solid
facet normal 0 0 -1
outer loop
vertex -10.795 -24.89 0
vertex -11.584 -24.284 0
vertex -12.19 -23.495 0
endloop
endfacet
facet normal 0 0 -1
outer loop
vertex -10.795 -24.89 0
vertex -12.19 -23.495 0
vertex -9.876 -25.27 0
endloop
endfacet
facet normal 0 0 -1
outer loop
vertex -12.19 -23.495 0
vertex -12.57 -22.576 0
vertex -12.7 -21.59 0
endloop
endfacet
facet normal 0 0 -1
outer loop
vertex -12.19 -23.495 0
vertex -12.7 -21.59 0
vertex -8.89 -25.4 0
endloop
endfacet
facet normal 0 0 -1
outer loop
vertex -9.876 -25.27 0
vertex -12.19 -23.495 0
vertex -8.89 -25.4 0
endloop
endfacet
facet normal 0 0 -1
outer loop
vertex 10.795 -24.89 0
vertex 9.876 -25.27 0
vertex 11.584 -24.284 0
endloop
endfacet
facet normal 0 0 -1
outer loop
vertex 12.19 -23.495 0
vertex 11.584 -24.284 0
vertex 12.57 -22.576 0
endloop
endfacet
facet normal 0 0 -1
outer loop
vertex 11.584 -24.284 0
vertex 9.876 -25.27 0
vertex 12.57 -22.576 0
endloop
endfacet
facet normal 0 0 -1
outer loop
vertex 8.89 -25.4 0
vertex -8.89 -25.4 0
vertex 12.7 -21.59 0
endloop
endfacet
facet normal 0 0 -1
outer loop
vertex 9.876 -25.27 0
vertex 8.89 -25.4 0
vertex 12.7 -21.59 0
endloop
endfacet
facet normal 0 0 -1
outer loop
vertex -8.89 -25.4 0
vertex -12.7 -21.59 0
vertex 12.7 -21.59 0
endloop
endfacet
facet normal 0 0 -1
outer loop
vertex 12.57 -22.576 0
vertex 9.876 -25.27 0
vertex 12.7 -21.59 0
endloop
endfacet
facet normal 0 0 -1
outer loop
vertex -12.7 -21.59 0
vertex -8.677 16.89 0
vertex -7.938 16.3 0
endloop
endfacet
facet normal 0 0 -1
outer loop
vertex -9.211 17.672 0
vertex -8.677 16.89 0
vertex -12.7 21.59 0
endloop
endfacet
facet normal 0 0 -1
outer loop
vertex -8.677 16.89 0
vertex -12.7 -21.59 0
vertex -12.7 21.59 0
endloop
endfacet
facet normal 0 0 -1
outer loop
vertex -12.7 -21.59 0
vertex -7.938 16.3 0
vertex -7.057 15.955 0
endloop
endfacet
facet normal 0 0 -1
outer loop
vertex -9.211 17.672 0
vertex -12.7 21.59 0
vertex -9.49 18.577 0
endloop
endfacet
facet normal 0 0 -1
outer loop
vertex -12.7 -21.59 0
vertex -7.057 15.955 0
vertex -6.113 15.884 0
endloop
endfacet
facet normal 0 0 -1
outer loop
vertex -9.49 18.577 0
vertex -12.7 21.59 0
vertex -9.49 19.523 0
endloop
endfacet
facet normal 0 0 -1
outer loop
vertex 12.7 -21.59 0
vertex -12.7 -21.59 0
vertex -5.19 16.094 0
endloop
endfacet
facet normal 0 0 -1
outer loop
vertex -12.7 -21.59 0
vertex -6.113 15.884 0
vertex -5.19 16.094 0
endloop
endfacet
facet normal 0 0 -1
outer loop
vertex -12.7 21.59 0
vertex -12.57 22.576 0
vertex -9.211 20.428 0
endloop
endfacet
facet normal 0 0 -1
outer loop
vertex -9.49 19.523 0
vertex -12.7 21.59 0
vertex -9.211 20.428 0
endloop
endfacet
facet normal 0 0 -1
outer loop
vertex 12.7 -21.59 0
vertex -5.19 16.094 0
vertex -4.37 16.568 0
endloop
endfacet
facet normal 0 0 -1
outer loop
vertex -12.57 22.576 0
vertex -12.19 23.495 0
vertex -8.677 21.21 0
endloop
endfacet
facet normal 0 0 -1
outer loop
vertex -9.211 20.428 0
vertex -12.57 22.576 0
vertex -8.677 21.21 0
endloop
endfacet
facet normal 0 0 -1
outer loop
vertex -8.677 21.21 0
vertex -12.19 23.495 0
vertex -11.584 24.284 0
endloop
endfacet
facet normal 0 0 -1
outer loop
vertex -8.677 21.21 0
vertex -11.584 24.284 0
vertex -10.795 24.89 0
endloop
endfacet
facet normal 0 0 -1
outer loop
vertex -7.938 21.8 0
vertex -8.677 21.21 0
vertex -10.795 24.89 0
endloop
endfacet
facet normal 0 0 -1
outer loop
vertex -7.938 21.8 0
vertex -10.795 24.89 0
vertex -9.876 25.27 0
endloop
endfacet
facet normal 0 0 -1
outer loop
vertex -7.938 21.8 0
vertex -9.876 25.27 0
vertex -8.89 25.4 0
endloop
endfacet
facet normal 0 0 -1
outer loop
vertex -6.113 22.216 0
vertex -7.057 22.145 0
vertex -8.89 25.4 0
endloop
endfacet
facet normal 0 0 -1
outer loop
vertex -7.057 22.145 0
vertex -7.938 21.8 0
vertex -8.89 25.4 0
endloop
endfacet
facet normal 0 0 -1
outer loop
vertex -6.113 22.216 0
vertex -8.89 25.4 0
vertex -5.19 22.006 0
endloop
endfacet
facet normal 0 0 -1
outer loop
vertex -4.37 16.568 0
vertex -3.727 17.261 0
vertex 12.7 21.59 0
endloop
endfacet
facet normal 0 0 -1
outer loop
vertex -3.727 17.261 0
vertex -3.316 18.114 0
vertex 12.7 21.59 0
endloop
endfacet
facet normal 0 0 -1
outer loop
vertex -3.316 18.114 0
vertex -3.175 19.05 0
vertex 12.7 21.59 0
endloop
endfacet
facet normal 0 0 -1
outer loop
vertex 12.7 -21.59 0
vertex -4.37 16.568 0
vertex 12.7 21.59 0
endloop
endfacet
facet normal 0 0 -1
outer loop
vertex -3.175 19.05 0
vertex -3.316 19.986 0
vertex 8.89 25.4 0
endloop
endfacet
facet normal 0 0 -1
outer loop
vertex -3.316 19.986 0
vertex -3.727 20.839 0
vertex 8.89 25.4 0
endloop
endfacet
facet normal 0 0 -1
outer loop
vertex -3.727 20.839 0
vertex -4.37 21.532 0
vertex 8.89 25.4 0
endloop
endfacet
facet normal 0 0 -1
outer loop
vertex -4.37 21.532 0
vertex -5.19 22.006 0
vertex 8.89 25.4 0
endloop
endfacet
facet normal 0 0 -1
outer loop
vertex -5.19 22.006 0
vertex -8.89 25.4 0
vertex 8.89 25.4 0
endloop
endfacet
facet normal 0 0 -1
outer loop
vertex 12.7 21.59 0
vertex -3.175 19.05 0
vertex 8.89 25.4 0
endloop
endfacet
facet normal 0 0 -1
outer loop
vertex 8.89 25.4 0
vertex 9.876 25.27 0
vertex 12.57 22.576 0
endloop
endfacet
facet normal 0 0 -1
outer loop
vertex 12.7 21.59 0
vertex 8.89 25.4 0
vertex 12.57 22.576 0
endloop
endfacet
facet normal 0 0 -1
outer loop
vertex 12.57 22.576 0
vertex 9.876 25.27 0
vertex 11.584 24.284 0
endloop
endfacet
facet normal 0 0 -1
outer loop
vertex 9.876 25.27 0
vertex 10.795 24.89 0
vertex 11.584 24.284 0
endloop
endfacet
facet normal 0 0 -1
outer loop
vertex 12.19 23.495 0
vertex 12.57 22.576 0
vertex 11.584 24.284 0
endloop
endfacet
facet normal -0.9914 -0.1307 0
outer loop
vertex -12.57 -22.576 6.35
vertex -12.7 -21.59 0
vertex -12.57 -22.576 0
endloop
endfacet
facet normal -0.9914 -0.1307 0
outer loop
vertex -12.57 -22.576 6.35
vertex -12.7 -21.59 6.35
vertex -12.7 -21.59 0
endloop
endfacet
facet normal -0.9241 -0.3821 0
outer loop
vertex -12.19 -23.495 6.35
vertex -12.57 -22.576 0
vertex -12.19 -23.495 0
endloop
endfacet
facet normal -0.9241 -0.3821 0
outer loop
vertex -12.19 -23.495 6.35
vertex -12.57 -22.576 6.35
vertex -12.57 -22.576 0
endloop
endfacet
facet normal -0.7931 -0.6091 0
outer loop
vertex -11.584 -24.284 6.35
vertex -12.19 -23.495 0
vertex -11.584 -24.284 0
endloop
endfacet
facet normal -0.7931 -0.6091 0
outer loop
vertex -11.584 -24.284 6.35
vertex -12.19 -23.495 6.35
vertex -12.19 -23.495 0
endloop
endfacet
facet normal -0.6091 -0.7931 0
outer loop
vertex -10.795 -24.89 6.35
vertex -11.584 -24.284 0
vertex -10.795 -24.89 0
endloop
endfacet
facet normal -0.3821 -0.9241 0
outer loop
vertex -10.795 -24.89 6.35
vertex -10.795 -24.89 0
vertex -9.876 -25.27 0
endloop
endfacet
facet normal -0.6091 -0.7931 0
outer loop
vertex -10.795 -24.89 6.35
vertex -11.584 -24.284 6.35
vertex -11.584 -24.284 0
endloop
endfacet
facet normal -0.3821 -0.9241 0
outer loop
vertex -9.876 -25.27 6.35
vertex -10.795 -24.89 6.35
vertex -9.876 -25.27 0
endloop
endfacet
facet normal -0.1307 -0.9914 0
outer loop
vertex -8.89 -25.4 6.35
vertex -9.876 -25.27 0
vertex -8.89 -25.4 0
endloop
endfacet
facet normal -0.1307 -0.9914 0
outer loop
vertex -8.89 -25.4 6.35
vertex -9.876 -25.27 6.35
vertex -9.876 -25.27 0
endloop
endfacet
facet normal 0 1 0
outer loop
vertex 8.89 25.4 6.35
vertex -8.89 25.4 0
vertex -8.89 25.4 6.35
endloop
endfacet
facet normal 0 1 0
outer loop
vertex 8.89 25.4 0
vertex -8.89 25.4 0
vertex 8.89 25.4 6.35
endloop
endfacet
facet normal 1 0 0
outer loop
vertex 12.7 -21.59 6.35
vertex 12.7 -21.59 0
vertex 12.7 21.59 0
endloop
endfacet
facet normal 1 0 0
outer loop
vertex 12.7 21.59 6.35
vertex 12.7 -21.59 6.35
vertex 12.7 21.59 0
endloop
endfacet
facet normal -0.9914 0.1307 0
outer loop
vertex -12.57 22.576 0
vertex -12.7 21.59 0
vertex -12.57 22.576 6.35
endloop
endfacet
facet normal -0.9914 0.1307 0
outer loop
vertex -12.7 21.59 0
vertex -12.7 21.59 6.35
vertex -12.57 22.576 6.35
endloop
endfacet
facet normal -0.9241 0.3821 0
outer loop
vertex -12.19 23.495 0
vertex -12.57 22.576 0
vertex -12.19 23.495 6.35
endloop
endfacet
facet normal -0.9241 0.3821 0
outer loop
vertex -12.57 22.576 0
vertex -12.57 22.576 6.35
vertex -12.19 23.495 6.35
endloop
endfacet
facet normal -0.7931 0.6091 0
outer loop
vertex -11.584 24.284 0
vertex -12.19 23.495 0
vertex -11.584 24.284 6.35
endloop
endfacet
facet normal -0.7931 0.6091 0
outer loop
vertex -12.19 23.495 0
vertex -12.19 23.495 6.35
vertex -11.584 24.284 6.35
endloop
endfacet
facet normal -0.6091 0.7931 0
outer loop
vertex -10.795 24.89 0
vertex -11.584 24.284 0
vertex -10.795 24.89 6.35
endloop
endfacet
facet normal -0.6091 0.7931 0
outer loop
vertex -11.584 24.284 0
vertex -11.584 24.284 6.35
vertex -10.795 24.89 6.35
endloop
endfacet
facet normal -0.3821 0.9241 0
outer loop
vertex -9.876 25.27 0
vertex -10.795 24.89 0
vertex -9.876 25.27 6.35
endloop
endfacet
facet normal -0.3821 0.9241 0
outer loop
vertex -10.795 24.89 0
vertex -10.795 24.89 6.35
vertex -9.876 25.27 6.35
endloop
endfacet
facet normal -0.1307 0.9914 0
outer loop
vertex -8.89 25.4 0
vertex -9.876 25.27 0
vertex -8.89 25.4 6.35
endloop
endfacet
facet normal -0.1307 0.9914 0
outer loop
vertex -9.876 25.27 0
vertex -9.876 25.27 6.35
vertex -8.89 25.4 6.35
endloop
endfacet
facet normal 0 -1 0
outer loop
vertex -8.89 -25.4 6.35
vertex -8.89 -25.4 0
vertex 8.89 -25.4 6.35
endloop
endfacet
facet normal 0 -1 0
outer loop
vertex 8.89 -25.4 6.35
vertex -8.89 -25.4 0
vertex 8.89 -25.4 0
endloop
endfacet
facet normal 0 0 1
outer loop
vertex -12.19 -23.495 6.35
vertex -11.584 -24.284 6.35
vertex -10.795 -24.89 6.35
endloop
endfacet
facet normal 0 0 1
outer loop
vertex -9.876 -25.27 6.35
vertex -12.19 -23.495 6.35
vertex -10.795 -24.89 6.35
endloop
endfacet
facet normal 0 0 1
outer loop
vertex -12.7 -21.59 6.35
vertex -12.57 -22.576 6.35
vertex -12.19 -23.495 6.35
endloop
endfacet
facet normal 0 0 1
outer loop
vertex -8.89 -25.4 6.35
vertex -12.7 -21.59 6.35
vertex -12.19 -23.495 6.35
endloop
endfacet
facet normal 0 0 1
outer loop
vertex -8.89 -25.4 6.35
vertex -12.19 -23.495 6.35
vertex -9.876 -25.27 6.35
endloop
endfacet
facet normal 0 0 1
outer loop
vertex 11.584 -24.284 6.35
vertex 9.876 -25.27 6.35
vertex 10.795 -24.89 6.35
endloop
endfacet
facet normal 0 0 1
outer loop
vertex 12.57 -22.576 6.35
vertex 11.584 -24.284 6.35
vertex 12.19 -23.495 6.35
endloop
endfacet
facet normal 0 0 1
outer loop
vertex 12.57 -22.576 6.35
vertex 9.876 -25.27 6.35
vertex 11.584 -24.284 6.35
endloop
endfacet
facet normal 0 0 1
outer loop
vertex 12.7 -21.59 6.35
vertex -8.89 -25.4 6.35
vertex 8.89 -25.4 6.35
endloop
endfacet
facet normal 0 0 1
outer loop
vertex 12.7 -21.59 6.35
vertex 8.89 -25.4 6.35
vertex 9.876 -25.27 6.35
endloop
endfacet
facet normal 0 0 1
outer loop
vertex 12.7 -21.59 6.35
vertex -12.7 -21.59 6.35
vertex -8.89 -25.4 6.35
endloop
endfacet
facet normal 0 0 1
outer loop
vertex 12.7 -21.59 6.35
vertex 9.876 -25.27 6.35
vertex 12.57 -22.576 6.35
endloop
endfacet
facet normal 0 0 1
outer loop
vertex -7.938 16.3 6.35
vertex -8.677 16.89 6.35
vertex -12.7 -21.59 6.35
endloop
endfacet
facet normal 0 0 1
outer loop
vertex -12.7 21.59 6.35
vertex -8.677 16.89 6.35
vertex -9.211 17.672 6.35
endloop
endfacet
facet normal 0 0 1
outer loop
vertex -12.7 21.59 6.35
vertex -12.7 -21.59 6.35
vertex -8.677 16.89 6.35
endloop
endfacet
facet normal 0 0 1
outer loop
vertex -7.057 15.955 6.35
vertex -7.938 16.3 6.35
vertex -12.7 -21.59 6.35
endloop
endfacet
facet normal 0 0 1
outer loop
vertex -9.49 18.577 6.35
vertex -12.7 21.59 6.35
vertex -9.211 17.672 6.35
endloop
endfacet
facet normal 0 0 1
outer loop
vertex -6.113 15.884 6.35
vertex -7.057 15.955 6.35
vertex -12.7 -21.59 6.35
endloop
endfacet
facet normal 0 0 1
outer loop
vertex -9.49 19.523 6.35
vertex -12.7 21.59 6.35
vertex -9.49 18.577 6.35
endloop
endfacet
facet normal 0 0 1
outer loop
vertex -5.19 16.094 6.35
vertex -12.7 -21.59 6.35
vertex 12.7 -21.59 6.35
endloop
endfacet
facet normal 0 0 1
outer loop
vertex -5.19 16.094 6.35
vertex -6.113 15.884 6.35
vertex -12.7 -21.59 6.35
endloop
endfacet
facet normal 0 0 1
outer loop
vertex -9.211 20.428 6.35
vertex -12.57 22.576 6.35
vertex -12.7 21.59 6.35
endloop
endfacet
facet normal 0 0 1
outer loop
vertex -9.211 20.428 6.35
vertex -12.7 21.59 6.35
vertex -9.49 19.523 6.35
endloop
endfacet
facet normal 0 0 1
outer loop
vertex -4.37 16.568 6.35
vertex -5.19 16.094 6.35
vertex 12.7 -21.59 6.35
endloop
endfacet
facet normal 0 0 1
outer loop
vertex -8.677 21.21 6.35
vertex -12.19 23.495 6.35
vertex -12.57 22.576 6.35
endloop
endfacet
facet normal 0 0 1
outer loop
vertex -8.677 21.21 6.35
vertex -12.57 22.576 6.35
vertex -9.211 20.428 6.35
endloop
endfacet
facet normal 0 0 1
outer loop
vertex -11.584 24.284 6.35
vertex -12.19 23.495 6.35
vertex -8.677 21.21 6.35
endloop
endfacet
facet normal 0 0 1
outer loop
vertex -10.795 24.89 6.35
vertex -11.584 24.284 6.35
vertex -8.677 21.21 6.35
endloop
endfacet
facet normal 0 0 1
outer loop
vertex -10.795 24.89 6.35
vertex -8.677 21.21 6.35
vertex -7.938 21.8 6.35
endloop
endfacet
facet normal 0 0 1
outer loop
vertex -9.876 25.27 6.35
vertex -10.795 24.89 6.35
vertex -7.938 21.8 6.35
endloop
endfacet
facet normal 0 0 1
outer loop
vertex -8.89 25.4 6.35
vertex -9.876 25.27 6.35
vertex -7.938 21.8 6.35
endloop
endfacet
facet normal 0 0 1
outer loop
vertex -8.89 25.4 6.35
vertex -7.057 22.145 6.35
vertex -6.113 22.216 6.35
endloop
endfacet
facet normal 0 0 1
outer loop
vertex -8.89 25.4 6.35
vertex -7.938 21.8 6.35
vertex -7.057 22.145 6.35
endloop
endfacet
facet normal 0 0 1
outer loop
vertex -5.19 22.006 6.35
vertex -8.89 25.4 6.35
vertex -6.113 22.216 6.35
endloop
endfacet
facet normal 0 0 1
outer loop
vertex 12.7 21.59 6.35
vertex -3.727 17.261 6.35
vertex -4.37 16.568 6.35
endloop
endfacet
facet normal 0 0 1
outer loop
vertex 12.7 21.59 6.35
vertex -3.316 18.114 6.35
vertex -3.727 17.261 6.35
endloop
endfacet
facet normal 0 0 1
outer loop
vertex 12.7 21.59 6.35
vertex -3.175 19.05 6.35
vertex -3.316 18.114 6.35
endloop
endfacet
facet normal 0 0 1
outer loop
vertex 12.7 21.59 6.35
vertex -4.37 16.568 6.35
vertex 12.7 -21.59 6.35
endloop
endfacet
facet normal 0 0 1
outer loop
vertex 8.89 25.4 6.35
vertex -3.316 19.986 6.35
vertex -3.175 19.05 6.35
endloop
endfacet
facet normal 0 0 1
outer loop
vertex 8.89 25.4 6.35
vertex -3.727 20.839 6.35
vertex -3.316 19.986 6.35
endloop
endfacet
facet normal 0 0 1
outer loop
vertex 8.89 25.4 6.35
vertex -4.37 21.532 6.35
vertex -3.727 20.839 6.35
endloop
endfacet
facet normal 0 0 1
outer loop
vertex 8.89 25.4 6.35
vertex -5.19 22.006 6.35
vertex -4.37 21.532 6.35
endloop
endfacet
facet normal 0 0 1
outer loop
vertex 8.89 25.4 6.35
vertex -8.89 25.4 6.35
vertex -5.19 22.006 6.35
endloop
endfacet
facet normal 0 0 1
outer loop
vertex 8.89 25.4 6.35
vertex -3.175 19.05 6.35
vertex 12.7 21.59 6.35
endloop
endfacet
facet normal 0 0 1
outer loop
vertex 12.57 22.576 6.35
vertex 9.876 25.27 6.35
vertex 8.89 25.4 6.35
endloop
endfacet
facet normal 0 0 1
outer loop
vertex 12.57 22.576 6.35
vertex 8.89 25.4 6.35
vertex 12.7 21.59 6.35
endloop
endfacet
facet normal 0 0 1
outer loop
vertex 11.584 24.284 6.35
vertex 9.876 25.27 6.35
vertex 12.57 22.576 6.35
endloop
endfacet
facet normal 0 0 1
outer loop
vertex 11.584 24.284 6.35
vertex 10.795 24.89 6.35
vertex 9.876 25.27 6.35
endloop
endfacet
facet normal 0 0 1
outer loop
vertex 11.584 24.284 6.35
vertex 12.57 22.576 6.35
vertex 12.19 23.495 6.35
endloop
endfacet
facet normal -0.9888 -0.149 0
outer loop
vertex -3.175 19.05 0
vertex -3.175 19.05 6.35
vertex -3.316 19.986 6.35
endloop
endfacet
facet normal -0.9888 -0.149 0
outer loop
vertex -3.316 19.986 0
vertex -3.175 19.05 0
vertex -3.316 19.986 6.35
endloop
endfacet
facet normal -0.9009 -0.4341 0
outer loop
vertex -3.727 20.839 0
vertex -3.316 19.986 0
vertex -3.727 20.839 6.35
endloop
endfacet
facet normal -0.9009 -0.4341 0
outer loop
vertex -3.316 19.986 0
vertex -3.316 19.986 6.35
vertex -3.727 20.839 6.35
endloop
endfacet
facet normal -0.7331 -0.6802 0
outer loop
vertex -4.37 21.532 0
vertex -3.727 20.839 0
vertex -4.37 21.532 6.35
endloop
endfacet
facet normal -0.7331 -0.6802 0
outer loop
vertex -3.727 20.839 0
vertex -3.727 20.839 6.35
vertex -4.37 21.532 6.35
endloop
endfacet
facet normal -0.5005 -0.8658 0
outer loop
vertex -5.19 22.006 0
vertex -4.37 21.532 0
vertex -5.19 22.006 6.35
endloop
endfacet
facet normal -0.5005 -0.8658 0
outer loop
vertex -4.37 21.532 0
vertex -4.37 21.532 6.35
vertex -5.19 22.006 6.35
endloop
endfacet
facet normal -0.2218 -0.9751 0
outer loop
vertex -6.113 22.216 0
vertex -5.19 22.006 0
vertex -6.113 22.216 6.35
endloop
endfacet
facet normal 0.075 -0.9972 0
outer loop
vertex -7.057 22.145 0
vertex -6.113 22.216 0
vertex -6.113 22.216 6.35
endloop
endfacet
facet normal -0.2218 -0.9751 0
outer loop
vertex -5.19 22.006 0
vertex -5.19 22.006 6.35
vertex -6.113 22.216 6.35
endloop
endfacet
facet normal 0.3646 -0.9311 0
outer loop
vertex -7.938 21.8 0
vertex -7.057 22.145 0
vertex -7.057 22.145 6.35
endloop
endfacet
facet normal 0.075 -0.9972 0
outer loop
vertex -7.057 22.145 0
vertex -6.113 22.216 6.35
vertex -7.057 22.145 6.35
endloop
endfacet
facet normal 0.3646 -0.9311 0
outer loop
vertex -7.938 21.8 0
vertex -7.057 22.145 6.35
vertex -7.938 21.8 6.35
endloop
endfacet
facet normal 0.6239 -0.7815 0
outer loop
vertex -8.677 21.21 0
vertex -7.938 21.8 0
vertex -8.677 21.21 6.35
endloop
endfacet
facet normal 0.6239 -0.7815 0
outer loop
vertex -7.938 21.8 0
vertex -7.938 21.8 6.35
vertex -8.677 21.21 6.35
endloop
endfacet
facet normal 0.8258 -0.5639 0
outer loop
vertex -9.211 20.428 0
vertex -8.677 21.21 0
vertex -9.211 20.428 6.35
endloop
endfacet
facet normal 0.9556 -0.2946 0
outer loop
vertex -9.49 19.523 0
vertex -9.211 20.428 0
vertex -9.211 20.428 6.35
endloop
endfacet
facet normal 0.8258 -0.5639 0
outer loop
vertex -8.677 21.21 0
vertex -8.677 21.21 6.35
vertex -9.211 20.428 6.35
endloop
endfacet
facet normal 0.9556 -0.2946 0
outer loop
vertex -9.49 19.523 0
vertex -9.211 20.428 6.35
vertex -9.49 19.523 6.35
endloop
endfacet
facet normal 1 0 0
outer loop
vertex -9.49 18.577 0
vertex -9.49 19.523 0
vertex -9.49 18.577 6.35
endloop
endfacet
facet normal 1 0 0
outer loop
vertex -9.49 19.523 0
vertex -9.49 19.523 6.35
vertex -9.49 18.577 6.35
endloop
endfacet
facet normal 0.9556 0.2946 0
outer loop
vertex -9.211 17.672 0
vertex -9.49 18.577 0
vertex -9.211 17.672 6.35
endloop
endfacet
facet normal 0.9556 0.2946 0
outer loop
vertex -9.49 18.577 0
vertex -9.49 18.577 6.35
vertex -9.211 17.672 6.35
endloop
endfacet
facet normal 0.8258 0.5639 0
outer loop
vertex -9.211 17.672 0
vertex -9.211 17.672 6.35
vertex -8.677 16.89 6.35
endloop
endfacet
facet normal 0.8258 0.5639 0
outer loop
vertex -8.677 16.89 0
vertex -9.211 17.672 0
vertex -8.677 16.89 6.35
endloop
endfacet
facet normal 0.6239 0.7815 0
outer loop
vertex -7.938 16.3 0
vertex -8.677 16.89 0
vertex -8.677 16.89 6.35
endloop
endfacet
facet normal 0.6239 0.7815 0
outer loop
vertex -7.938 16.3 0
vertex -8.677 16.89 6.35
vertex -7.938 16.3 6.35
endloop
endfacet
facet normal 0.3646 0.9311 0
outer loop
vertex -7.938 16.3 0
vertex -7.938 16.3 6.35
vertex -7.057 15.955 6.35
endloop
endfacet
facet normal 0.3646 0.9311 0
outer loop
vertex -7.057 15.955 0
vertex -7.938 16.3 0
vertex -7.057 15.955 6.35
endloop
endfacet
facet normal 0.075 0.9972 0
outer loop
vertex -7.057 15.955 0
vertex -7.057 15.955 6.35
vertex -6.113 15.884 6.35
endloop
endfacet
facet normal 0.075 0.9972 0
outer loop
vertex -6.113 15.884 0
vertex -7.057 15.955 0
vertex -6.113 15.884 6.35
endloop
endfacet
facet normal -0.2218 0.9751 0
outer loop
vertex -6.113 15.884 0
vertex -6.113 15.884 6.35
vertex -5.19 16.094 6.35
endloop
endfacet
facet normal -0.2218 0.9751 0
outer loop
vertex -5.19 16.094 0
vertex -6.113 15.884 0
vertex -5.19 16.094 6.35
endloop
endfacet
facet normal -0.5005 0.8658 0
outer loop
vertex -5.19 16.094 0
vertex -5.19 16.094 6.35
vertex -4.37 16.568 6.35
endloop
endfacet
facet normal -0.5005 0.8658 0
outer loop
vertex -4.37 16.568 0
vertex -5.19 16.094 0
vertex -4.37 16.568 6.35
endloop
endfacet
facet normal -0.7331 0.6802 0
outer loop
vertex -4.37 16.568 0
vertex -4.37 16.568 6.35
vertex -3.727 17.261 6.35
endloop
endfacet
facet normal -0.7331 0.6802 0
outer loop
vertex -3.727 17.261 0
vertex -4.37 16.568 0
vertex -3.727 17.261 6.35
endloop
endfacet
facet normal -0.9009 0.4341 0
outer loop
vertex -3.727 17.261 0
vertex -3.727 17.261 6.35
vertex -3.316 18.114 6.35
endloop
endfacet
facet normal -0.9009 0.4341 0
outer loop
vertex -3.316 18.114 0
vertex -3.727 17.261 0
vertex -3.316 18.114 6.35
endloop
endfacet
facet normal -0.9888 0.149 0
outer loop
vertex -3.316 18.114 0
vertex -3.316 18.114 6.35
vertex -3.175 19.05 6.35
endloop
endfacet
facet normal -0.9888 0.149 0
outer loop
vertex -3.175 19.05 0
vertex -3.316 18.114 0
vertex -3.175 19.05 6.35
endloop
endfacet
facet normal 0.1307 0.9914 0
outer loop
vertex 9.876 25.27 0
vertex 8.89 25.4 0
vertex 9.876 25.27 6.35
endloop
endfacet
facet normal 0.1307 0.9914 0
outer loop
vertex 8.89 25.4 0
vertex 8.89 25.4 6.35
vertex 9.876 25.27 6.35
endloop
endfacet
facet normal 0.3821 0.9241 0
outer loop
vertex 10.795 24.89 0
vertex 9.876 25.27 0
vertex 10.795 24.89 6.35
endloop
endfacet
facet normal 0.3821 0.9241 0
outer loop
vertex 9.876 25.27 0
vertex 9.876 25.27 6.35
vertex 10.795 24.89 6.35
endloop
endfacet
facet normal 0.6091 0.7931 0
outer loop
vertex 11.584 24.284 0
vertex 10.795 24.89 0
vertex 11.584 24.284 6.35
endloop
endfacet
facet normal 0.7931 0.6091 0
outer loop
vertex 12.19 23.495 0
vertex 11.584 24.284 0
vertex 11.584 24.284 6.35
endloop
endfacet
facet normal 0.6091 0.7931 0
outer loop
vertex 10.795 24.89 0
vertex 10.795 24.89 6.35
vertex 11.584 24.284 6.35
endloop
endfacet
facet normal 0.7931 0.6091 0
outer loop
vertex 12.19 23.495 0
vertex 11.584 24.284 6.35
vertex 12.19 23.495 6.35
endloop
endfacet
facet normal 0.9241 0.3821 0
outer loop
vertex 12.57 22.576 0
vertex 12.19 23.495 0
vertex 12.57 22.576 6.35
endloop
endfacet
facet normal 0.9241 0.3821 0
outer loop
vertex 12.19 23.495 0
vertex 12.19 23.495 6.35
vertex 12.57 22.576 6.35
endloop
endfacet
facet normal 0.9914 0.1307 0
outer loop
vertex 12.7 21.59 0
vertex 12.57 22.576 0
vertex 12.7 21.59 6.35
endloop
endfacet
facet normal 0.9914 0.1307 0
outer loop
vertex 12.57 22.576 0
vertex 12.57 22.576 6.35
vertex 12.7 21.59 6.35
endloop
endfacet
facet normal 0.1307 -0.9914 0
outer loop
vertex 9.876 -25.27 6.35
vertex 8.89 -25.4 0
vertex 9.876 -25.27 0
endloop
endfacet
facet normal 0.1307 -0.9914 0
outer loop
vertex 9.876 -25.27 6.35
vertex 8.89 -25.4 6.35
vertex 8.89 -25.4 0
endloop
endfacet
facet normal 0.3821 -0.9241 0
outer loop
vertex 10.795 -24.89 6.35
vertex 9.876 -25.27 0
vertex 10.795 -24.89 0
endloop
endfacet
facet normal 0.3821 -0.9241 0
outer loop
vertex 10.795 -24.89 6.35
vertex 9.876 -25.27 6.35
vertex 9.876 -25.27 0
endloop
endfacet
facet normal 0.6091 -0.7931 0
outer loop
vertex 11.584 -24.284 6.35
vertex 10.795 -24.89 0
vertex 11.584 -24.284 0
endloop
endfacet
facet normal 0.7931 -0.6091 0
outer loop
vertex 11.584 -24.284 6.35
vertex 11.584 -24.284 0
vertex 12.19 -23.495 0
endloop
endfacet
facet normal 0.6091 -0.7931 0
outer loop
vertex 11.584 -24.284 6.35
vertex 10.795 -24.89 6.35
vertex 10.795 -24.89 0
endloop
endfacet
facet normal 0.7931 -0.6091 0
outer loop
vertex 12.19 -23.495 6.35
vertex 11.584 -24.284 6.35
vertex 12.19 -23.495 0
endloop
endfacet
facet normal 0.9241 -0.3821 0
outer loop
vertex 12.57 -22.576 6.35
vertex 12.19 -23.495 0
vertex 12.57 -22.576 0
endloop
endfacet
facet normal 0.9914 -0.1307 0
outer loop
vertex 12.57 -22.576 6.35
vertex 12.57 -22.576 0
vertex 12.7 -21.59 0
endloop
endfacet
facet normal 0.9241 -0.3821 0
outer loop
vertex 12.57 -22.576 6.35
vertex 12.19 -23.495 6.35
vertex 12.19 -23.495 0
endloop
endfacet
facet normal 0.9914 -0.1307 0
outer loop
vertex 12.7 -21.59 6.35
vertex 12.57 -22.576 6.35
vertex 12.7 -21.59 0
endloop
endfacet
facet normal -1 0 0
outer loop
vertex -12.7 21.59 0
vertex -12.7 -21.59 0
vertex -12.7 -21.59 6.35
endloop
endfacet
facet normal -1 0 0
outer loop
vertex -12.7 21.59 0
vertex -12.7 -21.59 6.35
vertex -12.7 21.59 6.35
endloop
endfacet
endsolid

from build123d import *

# Parameters (mm, degrees)
F0_W     = 25.4
F0_H     = 50.8
F1_DEPTH = 6.35
F2_R     = 3.175
F3_DEPTH = 25.4
F4_R     = 3.81


with BuildPart() as f1:
    # F0 (on Top) → F1 (new body)
    with BuildSketch(Plane.XY):
        Rectangle(F0_W, F0_H)
    extrude(amount=F1_DEPTH)

    # F2 (on face) → F3 (cut)
    with BuildSketch(Plane.XY.offset(6.35)):
        with Locations((-6.35, 19.05)):
            Circle(F2_R)
    extrude(amount=-F3_DEPTH, mode=Mode.SUBTRACT)

    # F4
    f4_edges = [f1.edges().sort_by_distance(p)[0] for p in [
        (-12.7, 25.4, 3.175),
        (12.7, 25.4, 3.175),
        (-12.7, -25.4, 3.175),
        (12.7, -25.4, 3.175),
    ]]
    fillet(f4_edges, radius=F4_R)


solid = f1.part
